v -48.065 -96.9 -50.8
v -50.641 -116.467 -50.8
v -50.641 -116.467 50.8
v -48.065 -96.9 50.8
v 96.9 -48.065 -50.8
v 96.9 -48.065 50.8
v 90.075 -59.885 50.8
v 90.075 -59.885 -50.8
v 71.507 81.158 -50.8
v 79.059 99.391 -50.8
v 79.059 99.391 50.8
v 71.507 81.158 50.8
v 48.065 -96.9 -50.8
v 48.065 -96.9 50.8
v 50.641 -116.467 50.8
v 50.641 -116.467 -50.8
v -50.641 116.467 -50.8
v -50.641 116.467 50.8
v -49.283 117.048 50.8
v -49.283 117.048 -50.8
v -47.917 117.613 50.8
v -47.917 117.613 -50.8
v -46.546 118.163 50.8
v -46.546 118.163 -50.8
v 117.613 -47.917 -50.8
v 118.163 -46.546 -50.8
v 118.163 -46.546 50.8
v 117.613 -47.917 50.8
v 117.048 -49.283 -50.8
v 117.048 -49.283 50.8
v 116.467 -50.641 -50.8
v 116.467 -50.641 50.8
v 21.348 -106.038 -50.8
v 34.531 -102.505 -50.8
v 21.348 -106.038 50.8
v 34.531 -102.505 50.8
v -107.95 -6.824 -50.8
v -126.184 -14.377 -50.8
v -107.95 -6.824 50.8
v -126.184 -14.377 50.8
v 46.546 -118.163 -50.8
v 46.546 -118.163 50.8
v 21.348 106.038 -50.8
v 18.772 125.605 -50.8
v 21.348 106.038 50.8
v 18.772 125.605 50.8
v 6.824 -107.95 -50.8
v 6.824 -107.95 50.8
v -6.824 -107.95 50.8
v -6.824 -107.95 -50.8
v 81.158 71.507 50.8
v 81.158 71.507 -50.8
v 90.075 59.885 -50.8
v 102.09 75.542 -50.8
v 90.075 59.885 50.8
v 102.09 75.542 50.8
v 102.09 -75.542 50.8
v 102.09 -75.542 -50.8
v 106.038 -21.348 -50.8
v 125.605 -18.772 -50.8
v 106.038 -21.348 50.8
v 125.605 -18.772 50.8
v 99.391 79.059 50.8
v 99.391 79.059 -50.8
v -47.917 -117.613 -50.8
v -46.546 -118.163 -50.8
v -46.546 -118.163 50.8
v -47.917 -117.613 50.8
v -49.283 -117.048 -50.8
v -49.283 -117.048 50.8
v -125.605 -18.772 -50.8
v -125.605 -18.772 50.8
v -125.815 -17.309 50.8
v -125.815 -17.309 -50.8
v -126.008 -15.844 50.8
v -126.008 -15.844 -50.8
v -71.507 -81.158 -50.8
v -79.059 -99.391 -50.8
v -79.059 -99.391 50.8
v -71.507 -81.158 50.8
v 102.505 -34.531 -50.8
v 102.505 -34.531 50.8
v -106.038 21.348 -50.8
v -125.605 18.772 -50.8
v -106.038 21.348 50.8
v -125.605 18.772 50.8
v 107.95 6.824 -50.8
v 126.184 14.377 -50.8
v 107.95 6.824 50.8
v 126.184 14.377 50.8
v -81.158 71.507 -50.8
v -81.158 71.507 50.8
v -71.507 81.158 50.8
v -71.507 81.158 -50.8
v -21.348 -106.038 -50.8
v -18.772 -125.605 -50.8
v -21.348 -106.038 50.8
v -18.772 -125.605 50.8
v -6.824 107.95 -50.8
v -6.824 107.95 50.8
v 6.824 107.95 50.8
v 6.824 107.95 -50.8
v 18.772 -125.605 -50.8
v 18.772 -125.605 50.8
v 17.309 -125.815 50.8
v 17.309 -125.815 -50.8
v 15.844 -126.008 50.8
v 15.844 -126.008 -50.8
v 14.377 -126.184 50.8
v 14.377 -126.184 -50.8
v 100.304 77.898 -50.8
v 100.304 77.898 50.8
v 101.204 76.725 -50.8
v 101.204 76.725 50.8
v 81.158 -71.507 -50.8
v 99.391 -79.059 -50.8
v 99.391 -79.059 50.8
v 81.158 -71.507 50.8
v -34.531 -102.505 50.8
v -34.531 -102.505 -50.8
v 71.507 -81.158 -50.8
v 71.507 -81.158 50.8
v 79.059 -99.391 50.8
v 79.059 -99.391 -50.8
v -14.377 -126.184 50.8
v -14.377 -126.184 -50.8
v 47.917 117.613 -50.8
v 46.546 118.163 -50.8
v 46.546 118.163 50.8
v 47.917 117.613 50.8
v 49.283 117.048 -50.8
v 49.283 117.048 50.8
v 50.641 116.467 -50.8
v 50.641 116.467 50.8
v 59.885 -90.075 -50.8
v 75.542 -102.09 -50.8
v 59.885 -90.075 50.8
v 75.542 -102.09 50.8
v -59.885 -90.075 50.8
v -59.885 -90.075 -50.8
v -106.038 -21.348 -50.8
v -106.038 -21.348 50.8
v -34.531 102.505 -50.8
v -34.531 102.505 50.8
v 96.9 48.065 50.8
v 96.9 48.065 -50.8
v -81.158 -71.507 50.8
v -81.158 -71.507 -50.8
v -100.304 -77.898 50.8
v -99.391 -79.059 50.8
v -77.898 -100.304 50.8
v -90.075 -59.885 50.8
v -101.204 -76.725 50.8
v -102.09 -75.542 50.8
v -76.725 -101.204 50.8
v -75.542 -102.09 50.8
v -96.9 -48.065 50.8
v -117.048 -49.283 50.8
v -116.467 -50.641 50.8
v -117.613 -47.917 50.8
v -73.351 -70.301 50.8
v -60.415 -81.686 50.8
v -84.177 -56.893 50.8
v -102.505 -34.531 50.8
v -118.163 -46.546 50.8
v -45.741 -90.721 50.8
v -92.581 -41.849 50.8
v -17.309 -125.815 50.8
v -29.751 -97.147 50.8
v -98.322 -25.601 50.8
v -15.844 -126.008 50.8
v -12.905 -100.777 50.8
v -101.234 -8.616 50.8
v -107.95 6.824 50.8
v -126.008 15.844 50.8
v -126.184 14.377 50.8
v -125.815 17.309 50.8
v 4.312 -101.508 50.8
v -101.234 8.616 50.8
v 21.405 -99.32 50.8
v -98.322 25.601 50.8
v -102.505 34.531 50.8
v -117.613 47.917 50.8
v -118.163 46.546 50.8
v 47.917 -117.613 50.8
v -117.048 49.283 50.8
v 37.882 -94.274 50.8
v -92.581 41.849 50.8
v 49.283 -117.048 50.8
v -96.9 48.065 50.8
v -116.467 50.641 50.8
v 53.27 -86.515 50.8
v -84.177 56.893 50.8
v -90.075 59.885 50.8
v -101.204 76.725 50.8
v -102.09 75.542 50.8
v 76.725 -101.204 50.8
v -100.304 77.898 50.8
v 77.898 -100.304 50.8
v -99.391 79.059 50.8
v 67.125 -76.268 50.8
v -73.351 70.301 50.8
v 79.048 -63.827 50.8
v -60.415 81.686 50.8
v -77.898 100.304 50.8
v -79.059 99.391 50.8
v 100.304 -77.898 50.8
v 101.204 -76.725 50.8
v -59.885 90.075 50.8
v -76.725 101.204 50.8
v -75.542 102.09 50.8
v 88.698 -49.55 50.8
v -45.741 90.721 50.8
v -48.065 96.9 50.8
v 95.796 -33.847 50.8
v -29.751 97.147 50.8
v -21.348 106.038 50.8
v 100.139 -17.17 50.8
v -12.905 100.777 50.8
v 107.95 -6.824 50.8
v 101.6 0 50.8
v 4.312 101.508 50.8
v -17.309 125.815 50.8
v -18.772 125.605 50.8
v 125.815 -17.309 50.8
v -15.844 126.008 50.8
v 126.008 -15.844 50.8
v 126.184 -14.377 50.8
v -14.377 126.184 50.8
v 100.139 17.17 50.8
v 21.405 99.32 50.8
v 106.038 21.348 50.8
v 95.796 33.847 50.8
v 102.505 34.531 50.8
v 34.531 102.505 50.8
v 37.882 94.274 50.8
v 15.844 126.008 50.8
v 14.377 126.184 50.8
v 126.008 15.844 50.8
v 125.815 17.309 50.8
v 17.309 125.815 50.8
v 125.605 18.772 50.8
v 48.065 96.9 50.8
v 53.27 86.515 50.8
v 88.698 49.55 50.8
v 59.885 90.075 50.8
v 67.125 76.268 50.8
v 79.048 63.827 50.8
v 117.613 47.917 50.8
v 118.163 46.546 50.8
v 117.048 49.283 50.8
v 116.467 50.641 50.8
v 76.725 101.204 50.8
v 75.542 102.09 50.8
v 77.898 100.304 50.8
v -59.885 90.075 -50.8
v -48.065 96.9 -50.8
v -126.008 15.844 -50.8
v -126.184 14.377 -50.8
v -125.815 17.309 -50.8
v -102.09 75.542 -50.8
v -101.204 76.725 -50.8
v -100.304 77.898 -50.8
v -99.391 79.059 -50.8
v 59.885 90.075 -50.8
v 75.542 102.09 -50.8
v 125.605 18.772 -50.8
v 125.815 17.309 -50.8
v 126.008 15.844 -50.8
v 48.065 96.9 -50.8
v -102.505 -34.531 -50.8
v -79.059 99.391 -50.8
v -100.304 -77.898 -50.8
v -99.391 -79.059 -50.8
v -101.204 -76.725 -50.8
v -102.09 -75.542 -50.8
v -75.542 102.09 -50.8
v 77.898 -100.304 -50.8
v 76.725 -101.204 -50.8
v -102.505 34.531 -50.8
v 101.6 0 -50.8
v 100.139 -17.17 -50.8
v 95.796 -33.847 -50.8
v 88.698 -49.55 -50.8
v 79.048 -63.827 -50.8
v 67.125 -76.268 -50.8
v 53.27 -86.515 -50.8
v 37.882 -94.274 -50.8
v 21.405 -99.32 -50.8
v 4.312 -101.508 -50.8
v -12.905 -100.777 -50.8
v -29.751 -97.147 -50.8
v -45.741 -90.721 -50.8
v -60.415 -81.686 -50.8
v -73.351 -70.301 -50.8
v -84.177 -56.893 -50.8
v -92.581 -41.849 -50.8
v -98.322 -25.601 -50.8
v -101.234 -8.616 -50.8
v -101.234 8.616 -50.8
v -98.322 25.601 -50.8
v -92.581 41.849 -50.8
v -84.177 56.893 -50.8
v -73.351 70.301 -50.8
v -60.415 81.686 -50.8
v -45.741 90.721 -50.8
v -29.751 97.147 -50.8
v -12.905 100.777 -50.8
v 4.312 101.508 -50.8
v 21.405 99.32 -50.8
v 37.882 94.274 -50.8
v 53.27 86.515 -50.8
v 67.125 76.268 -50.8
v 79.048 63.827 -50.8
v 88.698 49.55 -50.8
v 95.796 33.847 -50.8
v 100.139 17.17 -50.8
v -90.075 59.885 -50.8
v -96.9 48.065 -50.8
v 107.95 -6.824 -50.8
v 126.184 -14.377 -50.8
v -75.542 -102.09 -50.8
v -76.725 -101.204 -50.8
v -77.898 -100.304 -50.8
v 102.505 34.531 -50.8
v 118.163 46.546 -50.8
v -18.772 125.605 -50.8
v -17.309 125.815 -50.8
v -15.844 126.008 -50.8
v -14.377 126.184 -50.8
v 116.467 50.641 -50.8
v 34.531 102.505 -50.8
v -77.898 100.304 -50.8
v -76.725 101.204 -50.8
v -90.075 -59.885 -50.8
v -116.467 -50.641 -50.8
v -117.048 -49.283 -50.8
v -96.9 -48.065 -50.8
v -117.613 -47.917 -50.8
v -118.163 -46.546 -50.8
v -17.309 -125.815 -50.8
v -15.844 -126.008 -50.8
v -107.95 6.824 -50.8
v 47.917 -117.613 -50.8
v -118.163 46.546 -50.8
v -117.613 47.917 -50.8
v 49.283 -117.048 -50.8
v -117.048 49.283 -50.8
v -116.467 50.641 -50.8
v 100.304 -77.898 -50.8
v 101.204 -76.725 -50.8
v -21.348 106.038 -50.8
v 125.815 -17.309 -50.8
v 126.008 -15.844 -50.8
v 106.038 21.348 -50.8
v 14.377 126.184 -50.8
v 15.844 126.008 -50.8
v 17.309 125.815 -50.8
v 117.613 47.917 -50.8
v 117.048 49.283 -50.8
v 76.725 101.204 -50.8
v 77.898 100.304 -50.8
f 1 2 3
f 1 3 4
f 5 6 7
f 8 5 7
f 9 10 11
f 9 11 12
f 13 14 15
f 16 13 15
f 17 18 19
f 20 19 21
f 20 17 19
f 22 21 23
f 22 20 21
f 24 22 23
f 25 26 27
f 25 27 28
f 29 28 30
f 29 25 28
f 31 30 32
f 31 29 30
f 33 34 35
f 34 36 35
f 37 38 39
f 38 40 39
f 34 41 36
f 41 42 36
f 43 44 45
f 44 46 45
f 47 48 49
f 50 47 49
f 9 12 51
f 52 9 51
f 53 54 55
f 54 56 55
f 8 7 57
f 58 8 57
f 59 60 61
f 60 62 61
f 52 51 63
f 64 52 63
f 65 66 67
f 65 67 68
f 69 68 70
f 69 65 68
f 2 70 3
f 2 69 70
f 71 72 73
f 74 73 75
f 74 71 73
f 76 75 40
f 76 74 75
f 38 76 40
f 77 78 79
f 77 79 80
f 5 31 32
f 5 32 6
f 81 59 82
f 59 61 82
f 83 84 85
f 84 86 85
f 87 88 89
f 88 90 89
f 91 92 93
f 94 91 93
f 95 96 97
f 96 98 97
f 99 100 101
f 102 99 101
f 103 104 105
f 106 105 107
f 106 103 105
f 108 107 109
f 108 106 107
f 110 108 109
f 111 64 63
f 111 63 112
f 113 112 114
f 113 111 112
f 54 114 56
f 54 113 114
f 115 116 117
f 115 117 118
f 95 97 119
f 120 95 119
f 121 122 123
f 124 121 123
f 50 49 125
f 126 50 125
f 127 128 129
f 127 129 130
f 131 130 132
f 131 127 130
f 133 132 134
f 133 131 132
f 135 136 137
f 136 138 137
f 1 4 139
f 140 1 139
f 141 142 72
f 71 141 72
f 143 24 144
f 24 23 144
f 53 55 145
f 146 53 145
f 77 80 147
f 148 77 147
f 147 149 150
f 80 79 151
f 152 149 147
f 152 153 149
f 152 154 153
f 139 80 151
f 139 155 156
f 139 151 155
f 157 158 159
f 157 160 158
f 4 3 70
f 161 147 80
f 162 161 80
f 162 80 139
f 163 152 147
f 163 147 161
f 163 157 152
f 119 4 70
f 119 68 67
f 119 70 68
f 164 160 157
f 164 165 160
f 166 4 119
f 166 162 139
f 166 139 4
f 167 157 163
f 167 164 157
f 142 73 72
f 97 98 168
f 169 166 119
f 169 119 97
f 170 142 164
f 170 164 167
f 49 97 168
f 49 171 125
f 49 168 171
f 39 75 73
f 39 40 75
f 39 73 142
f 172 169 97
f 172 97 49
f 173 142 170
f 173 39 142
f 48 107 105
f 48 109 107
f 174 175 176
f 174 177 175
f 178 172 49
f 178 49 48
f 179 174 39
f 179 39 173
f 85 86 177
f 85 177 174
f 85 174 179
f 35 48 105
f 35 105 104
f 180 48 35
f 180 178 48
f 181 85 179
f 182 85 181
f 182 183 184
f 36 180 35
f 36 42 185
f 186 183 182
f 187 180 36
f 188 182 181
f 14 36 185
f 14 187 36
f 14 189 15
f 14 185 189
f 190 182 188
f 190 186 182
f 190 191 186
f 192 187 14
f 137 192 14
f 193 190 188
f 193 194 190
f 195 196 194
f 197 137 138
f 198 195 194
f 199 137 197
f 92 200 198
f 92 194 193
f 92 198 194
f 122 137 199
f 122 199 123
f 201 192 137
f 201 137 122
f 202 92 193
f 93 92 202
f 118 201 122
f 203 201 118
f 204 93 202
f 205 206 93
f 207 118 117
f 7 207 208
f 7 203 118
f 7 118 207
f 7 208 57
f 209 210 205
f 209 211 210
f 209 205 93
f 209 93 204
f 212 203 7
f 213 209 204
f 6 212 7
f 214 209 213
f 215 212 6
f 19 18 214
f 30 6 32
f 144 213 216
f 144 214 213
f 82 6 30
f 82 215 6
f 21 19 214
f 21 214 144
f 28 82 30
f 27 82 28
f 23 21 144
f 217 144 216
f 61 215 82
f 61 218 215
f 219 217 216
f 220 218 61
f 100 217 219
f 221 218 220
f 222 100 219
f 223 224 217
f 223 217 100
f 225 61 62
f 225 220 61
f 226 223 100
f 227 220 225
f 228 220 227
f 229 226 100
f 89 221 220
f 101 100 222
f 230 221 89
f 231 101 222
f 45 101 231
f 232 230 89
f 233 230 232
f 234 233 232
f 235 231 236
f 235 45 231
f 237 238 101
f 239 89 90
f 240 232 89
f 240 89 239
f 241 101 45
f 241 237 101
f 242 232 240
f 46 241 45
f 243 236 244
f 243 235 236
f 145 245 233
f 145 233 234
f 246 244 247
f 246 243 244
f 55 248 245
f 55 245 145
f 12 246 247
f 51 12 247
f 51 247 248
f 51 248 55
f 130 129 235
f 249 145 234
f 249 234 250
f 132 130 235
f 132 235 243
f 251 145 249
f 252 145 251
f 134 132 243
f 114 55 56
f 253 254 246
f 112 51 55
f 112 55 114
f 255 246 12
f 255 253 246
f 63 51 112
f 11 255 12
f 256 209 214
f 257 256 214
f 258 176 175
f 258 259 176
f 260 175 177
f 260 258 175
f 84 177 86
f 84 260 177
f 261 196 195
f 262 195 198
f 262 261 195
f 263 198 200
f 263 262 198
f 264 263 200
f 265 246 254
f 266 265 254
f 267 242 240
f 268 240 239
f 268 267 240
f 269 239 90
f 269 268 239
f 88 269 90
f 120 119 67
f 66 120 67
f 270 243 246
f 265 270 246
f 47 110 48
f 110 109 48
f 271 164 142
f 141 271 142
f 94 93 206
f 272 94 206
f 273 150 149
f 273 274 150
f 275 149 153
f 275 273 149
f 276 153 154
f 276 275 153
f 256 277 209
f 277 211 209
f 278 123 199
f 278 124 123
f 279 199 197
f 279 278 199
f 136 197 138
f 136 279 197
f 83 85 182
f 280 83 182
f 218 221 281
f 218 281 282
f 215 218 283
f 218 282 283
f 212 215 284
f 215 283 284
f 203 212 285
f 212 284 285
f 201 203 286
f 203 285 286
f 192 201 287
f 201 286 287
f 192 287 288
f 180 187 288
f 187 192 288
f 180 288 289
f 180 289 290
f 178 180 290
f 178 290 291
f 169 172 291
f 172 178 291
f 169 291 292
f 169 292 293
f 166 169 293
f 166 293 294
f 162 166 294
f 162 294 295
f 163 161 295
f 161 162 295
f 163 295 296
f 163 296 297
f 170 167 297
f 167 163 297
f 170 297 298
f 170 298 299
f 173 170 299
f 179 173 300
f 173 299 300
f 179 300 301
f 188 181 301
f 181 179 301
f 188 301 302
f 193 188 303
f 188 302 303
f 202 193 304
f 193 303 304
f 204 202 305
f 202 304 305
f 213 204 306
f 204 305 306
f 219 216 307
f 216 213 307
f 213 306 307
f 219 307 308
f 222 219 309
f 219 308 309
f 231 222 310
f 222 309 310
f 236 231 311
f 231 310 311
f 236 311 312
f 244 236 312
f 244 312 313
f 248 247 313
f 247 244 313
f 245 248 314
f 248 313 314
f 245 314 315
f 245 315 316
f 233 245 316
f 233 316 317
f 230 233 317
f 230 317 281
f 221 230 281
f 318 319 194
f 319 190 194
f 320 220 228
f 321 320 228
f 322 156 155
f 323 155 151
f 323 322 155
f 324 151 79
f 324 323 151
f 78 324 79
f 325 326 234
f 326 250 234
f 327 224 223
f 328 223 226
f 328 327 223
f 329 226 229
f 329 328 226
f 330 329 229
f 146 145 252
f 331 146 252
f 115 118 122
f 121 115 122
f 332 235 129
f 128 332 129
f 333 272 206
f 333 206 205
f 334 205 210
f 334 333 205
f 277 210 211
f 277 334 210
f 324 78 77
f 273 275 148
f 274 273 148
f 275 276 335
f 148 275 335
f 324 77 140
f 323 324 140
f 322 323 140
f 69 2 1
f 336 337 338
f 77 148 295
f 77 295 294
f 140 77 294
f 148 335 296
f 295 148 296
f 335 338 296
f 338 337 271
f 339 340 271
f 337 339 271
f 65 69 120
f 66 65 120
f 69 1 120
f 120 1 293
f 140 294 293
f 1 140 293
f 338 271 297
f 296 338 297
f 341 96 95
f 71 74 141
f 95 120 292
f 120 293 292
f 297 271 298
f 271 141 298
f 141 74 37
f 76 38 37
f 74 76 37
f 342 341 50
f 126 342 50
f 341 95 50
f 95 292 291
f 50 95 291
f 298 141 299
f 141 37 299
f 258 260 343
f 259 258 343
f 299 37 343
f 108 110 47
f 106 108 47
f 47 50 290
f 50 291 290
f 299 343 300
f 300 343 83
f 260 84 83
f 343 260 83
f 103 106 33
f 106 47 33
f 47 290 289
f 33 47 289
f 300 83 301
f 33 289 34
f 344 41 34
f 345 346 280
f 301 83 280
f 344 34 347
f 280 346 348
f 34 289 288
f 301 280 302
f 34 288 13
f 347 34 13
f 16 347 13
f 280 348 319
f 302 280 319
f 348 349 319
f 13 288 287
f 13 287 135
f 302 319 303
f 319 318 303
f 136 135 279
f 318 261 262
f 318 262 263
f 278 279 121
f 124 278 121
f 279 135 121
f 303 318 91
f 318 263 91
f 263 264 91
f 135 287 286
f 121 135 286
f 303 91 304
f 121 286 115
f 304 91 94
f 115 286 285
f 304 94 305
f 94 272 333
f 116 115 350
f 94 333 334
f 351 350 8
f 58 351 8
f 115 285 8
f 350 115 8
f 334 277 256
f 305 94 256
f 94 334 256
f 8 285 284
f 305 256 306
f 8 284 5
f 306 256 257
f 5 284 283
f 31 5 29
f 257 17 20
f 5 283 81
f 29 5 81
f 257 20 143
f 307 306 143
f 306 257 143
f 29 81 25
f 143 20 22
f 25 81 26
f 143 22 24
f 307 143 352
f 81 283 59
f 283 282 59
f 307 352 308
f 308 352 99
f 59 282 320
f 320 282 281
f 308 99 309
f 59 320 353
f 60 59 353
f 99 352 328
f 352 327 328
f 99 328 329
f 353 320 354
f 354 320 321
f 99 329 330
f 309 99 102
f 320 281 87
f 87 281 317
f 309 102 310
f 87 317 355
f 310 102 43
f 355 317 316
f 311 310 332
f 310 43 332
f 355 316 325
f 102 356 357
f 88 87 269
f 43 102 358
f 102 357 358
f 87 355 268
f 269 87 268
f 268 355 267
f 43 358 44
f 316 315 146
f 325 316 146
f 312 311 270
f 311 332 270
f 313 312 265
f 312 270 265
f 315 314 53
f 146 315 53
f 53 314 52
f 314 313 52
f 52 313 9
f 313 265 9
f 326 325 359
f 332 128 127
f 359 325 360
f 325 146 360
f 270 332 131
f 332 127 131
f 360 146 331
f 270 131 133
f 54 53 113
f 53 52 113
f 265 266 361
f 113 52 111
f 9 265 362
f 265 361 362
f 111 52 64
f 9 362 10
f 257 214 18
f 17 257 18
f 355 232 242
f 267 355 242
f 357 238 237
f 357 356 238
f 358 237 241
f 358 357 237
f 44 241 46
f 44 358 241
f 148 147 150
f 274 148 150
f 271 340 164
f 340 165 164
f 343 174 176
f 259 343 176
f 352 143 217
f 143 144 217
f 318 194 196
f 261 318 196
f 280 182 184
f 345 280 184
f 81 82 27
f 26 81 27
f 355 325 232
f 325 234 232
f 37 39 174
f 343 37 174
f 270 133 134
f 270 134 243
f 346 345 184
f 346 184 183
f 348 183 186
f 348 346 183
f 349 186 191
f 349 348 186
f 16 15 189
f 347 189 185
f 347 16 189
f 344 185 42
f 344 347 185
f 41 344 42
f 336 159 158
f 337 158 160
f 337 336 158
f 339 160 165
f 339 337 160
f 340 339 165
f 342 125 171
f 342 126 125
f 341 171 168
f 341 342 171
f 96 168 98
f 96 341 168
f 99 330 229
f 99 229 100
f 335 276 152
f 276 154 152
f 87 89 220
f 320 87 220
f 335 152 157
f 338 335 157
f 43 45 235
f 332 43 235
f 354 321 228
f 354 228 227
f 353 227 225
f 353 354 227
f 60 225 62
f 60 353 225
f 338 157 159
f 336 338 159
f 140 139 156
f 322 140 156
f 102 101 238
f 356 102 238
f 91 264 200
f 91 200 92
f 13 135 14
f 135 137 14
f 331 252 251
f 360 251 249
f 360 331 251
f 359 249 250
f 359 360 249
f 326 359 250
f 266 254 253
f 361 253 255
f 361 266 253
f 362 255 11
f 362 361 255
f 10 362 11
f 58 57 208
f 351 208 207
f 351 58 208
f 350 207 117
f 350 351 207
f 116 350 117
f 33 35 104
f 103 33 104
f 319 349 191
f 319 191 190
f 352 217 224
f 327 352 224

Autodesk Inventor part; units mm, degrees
ref_plane "YZ Plane" through (0, 0, 0) normal (1, 0, 0) x (0, 1, 0)
ref_plane "XZ Plane" through (0, 0, 0) normal (0, 1, 0) x (-1, 0, 0)
ref_plane "XY Plane" through (0, 0, 0) normal (0, 0, 1) x (1, 0, 0)
sketch "Sketch1" plane through (0, 0, 0) normal (0, 0, 1) x (1, 0, 0)
  circle A0 centre (0, 0) radius 101.6
  circle A1 centre (0, 0) radius 127
  dimension "d0" = 203.2
  dimension "d1" = 25.4
extrude "Extrusion1" add sketch "Sketch1" along normal mid plane 101.6
sketch "Sketch2" plane through (0, 0, 50.8) normal (0, 0, 1) x (1, 0, 0)
  circle A0 centre (0, 0) radius 127 projected
  line L0 (-14.3768, 126.1836) -> (-6.8242, 107.95)
  line L1 (-6.8242, 107.95) -> (6.8242, 107.95)
  line L2 (6.8242, 107.95) -> (14.3768, 126.1836)
  line L3 (0, 107.95) -> (0, 128.4311) construction
  line L4 (-14.3768, 126.1836) -> (0, 0) construction
  line L5 (0, 0) -> (14.3768, 126.1836) construction
  arc A1 (14.3768, 126.1836) -> (-14.3768, 126.1836) centre (0, 0) ccw
  dimension "d4" = 19.05
  dimension "d5" = 45
  dimension "d6" = 13
extrude "Extrusion2" cut sketch "Sketch2" against normal through all contours L2 L1 L0 A0 picked at (1.6005, 114.2697)
pattern_circular "Circular Pattern1" count 24 over 360 about axis through (0, 0, 0) along (0, 0, 1) of "Extrusion2"
properties part number "NASA-20-HUB-TRD-01" material "PET Plastic"
